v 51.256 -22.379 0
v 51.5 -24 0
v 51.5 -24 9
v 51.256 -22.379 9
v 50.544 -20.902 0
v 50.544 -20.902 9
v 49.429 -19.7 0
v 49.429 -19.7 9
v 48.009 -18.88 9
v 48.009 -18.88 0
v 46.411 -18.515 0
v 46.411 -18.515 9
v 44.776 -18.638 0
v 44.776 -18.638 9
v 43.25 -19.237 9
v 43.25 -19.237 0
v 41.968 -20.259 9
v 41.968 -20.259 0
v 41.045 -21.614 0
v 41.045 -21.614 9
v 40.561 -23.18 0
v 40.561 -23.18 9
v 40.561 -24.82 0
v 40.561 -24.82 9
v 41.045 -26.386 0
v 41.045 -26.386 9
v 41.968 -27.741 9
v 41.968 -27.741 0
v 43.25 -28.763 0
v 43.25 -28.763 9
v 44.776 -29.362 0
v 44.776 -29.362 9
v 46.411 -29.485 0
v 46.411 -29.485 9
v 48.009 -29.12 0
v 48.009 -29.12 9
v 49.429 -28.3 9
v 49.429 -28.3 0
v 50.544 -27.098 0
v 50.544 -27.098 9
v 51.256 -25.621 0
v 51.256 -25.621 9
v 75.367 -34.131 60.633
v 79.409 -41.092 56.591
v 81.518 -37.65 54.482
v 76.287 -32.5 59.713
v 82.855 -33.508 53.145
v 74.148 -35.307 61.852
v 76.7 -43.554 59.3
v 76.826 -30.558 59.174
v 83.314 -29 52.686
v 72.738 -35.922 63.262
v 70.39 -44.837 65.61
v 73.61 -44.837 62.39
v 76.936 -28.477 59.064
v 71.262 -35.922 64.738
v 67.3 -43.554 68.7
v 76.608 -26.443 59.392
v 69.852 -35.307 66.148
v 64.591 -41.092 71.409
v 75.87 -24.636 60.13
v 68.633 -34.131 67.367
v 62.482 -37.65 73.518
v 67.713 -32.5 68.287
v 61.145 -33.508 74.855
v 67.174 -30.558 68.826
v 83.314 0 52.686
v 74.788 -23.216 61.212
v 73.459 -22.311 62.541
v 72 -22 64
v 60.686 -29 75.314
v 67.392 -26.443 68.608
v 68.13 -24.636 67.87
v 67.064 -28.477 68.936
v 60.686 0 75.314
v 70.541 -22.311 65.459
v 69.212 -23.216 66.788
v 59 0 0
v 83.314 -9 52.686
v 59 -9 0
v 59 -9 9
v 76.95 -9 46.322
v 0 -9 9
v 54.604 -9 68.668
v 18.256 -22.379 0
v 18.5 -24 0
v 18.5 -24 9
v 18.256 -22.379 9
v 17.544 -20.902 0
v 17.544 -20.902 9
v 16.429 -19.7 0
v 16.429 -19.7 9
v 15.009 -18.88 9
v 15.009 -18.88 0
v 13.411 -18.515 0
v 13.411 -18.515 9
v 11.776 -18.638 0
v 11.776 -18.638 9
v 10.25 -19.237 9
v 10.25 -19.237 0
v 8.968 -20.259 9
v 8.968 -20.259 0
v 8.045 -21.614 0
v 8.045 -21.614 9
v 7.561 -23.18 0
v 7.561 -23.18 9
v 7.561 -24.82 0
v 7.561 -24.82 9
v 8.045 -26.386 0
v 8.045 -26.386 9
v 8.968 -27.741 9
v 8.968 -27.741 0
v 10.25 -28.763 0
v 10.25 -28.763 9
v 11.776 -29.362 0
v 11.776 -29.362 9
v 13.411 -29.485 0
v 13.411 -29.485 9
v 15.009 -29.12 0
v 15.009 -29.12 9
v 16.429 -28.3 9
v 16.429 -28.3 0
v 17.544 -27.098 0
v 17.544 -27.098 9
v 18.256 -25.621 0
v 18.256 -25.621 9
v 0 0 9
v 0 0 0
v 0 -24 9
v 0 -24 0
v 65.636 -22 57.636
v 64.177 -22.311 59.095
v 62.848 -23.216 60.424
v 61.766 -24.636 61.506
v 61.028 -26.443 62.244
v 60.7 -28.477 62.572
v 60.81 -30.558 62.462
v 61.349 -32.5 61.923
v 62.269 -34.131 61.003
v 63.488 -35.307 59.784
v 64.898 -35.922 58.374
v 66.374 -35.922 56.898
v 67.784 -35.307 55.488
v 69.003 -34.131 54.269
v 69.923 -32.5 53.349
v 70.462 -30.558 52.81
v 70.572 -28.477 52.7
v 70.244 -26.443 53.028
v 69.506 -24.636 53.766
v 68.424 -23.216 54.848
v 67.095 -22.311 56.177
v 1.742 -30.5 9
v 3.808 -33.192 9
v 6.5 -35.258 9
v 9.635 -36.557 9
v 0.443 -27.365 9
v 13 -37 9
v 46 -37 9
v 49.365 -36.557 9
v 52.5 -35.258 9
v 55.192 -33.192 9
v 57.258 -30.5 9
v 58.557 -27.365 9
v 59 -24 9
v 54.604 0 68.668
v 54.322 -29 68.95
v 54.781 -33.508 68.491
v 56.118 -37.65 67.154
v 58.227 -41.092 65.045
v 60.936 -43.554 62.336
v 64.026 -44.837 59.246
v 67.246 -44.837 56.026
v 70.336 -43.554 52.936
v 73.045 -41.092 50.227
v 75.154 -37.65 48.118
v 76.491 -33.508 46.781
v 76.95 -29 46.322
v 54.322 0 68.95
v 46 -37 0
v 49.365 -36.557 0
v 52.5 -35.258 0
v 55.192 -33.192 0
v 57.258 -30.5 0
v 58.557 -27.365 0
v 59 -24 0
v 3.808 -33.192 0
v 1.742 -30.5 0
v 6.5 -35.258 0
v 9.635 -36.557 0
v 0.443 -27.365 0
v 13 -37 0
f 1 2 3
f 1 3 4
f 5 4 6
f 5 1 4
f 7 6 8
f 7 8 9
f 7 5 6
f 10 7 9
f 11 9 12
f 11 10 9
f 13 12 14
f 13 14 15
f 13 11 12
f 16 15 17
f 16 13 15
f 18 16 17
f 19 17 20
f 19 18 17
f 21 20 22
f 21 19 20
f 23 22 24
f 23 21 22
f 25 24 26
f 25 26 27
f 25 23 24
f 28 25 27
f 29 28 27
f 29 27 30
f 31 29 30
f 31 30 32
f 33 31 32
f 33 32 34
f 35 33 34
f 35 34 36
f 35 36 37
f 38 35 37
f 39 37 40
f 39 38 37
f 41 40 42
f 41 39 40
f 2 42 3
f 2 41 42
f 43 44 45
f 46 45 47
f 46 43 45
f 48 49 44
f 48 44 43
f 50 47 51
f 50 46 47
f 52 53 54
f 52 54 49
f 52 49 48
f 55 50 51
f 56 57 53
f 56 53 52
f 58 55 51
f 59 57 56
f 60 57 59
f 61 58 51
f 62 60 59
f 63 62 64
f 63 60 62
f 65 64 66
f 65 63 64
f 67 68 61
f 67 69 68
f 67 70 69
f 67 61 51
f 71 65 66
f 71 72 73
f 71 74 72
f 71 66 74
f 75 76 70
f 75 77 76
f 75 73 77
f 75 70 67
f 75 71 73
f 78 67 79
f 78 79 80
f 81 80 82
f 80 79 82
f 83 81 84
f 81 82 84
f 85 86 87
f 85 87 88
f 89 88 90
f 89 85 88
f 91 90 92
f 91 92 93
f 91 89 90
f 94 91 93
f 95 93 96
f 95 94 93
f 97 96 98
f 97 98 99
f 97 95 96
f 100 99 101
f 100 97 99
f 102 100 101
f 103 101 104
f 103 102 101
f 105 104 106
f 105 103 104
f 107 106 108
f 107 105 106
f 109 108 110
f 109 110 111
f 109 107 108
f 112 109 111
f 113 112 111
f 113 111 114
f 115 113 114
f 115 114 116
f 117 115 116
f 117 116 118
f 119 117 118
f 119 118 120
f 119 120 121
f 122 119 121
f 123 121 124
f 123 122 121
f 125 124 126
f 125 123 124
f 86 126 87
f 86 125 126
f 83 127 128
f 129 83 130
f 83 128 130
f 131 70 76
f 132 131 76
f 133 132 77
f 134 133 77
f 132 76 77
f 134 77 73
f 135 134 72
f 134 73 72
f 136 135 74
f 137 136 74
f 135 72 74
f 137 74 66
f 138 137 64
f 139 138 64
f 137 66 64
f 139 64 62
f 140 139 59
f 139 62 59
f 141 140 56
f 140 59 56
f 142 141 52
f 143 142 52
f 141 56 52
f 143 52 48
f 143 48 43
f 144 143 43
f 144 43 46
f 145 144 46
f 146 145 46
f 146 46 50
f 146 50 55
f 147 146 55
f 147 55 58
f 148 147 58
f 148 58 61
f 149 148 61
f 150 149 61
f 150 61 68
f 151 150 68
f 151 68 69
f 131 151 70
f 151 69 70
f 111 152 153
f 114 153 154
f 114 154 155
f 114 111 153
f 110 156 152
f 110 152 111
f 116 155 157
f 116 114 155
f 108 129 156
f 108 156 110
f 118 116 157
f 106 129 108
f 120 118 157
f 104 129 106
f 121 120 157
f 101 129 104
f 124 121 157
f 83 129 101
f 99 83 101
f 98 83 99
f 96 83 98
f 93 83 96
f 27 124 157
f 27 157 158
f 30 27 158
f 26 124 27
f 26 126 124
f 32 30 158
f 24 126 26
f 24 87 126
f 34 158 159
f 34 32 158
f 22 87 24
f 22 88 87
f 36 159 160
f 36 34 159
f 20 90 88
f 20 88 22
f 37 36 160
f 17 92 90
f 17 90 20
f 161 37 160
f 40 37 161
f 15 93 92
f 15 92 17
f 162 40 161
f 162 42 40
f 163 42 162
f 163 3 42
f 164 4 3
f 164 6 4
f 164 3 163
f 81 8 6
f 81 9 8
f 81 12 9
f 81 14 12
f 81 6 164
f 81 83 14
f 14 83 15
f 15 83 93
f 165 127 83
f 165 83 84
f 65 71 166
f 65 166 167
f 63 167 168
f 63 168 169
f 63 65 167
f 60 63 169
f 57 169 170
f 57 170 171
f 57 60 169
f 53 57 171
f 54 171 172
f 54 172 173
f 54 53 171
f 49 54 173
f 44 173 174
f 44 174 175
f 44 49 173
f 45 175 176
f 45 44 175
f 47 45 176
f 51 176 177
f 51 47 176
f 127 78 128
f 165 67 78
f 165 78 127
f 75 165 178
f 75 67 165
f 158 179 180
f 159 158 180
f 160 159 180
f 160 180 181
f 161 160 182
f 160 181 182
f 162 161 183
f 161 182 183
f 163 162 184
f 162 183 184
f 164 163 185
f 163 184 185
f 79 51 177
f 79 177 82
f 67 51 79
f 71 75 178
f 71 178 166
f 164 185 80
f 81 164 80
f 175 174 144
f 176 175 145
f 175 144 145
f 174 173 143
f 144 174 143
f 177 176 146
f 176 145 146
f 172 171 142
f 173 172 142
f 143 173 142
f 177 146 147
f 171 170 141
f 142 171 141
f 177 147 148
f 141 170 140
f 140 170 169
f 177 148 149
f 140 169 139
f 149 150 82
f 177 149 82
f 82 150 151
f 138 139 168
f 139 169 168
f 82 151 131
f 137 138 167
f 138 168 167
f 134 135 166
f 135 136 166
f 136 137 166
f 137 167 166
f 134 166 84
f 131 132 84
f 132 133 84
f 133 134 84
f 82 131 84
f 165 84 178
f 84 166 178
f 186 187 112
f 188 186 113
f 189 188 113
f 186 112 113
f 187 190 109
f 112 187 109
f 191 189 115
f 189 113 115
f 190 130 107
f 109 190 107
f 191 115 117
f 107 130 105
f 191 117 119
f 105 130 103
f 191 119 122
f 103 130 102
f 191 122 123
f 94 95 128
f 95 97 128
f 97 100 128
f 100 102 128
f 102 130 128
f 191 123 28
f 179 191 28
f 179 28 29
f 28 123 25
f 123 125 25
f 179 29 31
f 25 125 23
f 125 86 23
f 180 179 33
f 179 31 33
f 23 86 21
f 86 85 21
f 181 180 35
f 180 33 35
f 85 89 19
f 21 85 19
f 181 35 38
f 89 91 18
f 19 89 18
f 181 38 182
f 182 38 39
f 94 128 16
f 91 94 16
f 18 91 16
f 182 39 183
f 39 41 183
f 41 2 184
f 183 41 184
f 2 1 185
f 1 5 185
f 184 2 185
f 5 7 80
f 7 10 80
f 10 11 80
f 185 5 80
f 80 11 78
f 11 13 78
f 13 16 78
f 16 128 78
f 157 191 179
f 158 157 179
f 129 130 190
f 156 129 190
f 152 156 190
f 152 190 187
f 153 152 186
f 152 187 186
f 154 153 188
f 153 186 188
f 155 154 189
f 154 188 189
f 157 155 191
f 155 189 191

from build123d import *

# Parameters (mm, degrees)
F0_R     = 5.5
F1_DEPTH = 9
F3_DEPTH = 9
F4_R     = 7
F5_DEPTH = 9


with BuildPart() as f1:
    # F0 (on Top) → F1 (new body)
    with BuildSketch(Plane.XY):
        with BuildLine():
            Line((59, 0), (0, 0))
            Line((0, 0), (0, -24))
            ThreePointArc((0, -24), (3.807612, -33.192388), (13, -37))
            Line((13, -37), (46, -37))
            ThreePointArc((46, -37), (55.192388, -33.192388), (59, -24))
            Line((59, -24), (59, 0))
        make_face()
        with Locations((13, -24)):
            Circle(F0_R, mode=Mode.SUBTRACT)
        with Locations((46, -24)):
            Circle(F0_R, mode=Mode.SUBTRACT)
    extrude(amount=F1_DEPTH)

    # F2 (on face) → F3 (join)
    with BuildSketch(Plane(origin=(0, 0, 0), x_dir=(-1, 0, 0), z_dir=(0, 1, 0))):
        Polygon((-59, 9), (0, 9), (-60.686292, 75.313708), (-83.313708, 52.686292), (-59, 0), align=None)
    extrude(amount=-F3_DEPTH)

    # F4 (on face) → F5 (join)
    with BuildSketch(Plane(origin=(68, 0, 68), x_dir=(0, 1, 0), z_dir=(0.707107, 0, 0.707107))):
        with BuildLine():
            Line((-29, -21.656854), (0, -21.656854))
            Line((0, -21.656854), (0, 10.343146))
            Line((0, 10.343146), (-29, 10.343146))
            ThreePointArc((-29, 10.343146), (-45, -5.656854), (-29, -21.656854))
        make_face()
        with Locations((-29, -5.656854)):
            Circle(F4_R, mode=Mode.SUBTRACT)
    extrude(amount=-F5_DEPTH)


solid = f1.part
